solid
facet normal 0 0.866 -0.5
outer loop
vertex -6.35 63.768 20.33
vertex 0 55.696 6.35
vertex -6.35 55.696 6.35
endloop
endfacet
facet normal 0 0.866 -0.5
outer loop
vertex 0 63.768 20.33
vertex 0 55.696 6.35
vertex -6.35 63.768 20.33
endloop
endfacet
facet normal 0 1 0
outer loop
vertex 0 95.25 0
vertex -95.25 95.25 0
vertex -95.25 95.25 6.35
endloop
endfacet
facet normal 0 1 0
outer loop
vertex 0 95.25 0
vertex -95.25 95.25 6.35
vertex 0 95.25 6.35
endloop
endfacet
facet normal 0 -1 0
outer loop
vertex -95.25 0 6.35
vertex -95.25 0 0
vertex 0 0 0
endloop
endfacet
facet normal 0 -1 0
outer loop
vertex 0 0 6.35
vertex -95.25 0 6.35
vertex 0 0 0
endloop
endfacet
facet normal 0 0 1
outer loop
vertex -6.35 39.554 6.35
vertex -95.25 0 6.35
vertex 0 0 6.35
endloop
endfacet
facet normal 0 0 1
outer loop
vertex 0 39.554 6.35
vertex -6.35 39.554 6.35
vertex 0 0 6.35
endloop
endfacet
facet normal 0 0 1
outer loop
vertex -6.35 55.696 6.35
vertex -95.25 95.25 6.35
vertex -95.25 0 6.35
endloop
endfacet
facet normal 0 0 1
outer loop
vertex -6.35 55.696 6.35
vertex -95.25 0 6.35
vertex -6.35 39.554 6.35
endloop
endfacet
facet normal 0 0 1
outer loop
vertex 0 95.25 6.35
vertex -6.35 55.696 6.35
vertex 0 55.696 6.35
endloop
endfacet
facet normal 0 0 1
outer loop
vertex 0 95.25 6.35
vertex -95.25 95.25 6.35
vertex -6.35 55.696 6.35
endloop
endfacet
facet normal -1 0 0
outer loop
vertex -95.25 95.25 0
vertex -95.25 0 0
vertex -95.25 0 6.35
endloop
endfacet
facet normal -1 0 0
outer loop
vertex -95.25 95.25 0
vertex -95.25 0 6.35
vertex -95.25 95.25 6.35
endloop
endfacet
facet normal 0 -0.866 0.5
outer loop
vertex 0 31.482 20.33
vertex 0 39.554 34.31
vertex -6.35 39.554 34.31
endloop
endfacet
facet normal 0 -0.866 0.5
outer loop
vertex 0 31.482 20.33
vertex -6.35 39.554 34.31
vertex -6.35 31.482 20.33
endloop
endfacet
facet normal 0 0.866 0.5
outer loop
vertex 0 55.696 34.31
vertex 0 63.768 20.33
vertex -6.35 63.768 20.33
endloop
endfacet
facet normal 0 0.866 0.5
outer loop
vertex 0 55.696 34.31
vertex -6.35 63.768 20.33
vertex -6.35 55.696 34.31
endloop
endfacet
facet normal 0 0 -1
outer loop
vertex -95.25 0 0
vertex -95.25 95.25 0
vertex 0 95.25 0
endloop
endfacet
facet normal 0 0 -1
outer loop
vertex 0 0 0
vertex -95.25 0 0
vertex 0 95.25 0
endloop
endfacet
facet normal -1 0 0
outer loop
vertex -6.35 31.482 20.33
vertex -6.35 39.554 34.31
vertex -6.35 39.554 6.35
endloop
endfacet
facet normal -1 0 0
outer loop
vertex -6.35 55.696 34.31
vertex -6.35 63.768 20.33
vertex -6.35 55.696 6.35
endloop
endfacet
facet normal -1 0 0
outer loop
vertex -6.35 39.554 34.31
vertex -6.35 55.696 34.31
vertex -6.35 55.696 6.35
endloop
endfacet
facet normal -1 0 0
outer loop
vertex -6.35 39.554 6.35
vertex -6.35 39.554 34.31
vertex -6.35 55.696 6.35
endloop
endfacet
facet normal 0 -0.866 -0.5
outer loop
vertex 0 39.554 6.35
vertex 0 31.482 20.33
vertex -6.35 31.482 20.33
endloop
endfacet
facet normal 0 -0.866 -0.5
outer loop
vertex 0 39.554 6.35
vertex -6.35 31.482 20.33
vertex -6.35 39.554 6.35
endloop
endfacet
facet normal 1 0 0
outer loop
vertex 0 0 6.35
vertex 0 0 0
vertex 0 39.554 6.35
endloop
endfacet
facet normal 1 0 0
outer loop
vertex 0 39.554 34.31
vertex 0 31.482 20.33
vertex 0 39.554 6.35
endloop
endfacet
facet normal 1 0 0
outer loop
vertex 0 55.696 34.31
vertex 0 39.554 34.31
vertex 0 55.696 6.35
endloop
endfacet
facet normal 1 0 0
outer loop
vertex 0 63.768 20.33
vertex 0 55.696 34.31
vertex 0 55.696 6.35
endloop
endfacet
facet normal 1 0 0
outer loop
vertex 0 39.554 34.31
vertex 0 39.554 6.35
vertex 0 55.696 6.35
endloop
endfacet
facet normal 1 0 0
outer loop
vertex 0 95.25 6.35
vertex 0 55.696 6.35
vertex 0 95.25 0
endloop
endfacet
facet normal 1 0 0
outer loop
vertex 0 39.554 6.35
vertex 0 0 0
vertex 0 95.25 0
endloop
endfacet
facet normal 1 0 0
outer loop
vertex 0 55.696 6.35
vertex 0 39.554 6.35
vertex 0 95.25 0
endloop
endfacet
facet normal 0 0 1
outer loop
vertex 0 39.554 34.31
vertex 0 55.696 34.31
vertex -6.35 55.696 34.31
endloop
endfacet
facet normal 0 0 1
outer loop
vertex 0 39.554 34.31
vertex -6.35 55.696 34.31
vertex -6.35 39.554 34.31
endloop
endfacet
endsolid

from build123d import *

# Parameters (mm, degrees)
SKETCH1_W           = 95.25
SKETCH1_H           = 95.25
BOSS_EXTRUDE1_DEPTH = 6.35
BOSS_EXTRUDE2_DEPTH = 6.35


with BuildPart() as part:
    # Sketch1 → Boss-Extrude1 (new body)
    with BuildSketch(Plane.XY):
        with Locations((-47.625, 47.625)):
            Rectangle(SKETCH1_W, SKETCH1_H)
    extrude(amount=BOSS_EXTRUDE1_DEPTH)

    # Sketch3 → Boss-Extrude2 (add)
    with BuildSketch(Plane(origin=(0, 0, 0), x_dir=(0, 0, -1), z_dir=(1, 0, 0))):
        Polygon((-6.35, 55.696344872), (-20.329979404, 63.767689744), (-34.309958807, 55.696344872), (-34.309958807, 39.553655128), (-20.329979404, 31.482310256), (-6.35, 39.553655128), align=None)
    extrude(amount=-BOSS_EXTRUDE2_DEPTH)


solid = part.part
